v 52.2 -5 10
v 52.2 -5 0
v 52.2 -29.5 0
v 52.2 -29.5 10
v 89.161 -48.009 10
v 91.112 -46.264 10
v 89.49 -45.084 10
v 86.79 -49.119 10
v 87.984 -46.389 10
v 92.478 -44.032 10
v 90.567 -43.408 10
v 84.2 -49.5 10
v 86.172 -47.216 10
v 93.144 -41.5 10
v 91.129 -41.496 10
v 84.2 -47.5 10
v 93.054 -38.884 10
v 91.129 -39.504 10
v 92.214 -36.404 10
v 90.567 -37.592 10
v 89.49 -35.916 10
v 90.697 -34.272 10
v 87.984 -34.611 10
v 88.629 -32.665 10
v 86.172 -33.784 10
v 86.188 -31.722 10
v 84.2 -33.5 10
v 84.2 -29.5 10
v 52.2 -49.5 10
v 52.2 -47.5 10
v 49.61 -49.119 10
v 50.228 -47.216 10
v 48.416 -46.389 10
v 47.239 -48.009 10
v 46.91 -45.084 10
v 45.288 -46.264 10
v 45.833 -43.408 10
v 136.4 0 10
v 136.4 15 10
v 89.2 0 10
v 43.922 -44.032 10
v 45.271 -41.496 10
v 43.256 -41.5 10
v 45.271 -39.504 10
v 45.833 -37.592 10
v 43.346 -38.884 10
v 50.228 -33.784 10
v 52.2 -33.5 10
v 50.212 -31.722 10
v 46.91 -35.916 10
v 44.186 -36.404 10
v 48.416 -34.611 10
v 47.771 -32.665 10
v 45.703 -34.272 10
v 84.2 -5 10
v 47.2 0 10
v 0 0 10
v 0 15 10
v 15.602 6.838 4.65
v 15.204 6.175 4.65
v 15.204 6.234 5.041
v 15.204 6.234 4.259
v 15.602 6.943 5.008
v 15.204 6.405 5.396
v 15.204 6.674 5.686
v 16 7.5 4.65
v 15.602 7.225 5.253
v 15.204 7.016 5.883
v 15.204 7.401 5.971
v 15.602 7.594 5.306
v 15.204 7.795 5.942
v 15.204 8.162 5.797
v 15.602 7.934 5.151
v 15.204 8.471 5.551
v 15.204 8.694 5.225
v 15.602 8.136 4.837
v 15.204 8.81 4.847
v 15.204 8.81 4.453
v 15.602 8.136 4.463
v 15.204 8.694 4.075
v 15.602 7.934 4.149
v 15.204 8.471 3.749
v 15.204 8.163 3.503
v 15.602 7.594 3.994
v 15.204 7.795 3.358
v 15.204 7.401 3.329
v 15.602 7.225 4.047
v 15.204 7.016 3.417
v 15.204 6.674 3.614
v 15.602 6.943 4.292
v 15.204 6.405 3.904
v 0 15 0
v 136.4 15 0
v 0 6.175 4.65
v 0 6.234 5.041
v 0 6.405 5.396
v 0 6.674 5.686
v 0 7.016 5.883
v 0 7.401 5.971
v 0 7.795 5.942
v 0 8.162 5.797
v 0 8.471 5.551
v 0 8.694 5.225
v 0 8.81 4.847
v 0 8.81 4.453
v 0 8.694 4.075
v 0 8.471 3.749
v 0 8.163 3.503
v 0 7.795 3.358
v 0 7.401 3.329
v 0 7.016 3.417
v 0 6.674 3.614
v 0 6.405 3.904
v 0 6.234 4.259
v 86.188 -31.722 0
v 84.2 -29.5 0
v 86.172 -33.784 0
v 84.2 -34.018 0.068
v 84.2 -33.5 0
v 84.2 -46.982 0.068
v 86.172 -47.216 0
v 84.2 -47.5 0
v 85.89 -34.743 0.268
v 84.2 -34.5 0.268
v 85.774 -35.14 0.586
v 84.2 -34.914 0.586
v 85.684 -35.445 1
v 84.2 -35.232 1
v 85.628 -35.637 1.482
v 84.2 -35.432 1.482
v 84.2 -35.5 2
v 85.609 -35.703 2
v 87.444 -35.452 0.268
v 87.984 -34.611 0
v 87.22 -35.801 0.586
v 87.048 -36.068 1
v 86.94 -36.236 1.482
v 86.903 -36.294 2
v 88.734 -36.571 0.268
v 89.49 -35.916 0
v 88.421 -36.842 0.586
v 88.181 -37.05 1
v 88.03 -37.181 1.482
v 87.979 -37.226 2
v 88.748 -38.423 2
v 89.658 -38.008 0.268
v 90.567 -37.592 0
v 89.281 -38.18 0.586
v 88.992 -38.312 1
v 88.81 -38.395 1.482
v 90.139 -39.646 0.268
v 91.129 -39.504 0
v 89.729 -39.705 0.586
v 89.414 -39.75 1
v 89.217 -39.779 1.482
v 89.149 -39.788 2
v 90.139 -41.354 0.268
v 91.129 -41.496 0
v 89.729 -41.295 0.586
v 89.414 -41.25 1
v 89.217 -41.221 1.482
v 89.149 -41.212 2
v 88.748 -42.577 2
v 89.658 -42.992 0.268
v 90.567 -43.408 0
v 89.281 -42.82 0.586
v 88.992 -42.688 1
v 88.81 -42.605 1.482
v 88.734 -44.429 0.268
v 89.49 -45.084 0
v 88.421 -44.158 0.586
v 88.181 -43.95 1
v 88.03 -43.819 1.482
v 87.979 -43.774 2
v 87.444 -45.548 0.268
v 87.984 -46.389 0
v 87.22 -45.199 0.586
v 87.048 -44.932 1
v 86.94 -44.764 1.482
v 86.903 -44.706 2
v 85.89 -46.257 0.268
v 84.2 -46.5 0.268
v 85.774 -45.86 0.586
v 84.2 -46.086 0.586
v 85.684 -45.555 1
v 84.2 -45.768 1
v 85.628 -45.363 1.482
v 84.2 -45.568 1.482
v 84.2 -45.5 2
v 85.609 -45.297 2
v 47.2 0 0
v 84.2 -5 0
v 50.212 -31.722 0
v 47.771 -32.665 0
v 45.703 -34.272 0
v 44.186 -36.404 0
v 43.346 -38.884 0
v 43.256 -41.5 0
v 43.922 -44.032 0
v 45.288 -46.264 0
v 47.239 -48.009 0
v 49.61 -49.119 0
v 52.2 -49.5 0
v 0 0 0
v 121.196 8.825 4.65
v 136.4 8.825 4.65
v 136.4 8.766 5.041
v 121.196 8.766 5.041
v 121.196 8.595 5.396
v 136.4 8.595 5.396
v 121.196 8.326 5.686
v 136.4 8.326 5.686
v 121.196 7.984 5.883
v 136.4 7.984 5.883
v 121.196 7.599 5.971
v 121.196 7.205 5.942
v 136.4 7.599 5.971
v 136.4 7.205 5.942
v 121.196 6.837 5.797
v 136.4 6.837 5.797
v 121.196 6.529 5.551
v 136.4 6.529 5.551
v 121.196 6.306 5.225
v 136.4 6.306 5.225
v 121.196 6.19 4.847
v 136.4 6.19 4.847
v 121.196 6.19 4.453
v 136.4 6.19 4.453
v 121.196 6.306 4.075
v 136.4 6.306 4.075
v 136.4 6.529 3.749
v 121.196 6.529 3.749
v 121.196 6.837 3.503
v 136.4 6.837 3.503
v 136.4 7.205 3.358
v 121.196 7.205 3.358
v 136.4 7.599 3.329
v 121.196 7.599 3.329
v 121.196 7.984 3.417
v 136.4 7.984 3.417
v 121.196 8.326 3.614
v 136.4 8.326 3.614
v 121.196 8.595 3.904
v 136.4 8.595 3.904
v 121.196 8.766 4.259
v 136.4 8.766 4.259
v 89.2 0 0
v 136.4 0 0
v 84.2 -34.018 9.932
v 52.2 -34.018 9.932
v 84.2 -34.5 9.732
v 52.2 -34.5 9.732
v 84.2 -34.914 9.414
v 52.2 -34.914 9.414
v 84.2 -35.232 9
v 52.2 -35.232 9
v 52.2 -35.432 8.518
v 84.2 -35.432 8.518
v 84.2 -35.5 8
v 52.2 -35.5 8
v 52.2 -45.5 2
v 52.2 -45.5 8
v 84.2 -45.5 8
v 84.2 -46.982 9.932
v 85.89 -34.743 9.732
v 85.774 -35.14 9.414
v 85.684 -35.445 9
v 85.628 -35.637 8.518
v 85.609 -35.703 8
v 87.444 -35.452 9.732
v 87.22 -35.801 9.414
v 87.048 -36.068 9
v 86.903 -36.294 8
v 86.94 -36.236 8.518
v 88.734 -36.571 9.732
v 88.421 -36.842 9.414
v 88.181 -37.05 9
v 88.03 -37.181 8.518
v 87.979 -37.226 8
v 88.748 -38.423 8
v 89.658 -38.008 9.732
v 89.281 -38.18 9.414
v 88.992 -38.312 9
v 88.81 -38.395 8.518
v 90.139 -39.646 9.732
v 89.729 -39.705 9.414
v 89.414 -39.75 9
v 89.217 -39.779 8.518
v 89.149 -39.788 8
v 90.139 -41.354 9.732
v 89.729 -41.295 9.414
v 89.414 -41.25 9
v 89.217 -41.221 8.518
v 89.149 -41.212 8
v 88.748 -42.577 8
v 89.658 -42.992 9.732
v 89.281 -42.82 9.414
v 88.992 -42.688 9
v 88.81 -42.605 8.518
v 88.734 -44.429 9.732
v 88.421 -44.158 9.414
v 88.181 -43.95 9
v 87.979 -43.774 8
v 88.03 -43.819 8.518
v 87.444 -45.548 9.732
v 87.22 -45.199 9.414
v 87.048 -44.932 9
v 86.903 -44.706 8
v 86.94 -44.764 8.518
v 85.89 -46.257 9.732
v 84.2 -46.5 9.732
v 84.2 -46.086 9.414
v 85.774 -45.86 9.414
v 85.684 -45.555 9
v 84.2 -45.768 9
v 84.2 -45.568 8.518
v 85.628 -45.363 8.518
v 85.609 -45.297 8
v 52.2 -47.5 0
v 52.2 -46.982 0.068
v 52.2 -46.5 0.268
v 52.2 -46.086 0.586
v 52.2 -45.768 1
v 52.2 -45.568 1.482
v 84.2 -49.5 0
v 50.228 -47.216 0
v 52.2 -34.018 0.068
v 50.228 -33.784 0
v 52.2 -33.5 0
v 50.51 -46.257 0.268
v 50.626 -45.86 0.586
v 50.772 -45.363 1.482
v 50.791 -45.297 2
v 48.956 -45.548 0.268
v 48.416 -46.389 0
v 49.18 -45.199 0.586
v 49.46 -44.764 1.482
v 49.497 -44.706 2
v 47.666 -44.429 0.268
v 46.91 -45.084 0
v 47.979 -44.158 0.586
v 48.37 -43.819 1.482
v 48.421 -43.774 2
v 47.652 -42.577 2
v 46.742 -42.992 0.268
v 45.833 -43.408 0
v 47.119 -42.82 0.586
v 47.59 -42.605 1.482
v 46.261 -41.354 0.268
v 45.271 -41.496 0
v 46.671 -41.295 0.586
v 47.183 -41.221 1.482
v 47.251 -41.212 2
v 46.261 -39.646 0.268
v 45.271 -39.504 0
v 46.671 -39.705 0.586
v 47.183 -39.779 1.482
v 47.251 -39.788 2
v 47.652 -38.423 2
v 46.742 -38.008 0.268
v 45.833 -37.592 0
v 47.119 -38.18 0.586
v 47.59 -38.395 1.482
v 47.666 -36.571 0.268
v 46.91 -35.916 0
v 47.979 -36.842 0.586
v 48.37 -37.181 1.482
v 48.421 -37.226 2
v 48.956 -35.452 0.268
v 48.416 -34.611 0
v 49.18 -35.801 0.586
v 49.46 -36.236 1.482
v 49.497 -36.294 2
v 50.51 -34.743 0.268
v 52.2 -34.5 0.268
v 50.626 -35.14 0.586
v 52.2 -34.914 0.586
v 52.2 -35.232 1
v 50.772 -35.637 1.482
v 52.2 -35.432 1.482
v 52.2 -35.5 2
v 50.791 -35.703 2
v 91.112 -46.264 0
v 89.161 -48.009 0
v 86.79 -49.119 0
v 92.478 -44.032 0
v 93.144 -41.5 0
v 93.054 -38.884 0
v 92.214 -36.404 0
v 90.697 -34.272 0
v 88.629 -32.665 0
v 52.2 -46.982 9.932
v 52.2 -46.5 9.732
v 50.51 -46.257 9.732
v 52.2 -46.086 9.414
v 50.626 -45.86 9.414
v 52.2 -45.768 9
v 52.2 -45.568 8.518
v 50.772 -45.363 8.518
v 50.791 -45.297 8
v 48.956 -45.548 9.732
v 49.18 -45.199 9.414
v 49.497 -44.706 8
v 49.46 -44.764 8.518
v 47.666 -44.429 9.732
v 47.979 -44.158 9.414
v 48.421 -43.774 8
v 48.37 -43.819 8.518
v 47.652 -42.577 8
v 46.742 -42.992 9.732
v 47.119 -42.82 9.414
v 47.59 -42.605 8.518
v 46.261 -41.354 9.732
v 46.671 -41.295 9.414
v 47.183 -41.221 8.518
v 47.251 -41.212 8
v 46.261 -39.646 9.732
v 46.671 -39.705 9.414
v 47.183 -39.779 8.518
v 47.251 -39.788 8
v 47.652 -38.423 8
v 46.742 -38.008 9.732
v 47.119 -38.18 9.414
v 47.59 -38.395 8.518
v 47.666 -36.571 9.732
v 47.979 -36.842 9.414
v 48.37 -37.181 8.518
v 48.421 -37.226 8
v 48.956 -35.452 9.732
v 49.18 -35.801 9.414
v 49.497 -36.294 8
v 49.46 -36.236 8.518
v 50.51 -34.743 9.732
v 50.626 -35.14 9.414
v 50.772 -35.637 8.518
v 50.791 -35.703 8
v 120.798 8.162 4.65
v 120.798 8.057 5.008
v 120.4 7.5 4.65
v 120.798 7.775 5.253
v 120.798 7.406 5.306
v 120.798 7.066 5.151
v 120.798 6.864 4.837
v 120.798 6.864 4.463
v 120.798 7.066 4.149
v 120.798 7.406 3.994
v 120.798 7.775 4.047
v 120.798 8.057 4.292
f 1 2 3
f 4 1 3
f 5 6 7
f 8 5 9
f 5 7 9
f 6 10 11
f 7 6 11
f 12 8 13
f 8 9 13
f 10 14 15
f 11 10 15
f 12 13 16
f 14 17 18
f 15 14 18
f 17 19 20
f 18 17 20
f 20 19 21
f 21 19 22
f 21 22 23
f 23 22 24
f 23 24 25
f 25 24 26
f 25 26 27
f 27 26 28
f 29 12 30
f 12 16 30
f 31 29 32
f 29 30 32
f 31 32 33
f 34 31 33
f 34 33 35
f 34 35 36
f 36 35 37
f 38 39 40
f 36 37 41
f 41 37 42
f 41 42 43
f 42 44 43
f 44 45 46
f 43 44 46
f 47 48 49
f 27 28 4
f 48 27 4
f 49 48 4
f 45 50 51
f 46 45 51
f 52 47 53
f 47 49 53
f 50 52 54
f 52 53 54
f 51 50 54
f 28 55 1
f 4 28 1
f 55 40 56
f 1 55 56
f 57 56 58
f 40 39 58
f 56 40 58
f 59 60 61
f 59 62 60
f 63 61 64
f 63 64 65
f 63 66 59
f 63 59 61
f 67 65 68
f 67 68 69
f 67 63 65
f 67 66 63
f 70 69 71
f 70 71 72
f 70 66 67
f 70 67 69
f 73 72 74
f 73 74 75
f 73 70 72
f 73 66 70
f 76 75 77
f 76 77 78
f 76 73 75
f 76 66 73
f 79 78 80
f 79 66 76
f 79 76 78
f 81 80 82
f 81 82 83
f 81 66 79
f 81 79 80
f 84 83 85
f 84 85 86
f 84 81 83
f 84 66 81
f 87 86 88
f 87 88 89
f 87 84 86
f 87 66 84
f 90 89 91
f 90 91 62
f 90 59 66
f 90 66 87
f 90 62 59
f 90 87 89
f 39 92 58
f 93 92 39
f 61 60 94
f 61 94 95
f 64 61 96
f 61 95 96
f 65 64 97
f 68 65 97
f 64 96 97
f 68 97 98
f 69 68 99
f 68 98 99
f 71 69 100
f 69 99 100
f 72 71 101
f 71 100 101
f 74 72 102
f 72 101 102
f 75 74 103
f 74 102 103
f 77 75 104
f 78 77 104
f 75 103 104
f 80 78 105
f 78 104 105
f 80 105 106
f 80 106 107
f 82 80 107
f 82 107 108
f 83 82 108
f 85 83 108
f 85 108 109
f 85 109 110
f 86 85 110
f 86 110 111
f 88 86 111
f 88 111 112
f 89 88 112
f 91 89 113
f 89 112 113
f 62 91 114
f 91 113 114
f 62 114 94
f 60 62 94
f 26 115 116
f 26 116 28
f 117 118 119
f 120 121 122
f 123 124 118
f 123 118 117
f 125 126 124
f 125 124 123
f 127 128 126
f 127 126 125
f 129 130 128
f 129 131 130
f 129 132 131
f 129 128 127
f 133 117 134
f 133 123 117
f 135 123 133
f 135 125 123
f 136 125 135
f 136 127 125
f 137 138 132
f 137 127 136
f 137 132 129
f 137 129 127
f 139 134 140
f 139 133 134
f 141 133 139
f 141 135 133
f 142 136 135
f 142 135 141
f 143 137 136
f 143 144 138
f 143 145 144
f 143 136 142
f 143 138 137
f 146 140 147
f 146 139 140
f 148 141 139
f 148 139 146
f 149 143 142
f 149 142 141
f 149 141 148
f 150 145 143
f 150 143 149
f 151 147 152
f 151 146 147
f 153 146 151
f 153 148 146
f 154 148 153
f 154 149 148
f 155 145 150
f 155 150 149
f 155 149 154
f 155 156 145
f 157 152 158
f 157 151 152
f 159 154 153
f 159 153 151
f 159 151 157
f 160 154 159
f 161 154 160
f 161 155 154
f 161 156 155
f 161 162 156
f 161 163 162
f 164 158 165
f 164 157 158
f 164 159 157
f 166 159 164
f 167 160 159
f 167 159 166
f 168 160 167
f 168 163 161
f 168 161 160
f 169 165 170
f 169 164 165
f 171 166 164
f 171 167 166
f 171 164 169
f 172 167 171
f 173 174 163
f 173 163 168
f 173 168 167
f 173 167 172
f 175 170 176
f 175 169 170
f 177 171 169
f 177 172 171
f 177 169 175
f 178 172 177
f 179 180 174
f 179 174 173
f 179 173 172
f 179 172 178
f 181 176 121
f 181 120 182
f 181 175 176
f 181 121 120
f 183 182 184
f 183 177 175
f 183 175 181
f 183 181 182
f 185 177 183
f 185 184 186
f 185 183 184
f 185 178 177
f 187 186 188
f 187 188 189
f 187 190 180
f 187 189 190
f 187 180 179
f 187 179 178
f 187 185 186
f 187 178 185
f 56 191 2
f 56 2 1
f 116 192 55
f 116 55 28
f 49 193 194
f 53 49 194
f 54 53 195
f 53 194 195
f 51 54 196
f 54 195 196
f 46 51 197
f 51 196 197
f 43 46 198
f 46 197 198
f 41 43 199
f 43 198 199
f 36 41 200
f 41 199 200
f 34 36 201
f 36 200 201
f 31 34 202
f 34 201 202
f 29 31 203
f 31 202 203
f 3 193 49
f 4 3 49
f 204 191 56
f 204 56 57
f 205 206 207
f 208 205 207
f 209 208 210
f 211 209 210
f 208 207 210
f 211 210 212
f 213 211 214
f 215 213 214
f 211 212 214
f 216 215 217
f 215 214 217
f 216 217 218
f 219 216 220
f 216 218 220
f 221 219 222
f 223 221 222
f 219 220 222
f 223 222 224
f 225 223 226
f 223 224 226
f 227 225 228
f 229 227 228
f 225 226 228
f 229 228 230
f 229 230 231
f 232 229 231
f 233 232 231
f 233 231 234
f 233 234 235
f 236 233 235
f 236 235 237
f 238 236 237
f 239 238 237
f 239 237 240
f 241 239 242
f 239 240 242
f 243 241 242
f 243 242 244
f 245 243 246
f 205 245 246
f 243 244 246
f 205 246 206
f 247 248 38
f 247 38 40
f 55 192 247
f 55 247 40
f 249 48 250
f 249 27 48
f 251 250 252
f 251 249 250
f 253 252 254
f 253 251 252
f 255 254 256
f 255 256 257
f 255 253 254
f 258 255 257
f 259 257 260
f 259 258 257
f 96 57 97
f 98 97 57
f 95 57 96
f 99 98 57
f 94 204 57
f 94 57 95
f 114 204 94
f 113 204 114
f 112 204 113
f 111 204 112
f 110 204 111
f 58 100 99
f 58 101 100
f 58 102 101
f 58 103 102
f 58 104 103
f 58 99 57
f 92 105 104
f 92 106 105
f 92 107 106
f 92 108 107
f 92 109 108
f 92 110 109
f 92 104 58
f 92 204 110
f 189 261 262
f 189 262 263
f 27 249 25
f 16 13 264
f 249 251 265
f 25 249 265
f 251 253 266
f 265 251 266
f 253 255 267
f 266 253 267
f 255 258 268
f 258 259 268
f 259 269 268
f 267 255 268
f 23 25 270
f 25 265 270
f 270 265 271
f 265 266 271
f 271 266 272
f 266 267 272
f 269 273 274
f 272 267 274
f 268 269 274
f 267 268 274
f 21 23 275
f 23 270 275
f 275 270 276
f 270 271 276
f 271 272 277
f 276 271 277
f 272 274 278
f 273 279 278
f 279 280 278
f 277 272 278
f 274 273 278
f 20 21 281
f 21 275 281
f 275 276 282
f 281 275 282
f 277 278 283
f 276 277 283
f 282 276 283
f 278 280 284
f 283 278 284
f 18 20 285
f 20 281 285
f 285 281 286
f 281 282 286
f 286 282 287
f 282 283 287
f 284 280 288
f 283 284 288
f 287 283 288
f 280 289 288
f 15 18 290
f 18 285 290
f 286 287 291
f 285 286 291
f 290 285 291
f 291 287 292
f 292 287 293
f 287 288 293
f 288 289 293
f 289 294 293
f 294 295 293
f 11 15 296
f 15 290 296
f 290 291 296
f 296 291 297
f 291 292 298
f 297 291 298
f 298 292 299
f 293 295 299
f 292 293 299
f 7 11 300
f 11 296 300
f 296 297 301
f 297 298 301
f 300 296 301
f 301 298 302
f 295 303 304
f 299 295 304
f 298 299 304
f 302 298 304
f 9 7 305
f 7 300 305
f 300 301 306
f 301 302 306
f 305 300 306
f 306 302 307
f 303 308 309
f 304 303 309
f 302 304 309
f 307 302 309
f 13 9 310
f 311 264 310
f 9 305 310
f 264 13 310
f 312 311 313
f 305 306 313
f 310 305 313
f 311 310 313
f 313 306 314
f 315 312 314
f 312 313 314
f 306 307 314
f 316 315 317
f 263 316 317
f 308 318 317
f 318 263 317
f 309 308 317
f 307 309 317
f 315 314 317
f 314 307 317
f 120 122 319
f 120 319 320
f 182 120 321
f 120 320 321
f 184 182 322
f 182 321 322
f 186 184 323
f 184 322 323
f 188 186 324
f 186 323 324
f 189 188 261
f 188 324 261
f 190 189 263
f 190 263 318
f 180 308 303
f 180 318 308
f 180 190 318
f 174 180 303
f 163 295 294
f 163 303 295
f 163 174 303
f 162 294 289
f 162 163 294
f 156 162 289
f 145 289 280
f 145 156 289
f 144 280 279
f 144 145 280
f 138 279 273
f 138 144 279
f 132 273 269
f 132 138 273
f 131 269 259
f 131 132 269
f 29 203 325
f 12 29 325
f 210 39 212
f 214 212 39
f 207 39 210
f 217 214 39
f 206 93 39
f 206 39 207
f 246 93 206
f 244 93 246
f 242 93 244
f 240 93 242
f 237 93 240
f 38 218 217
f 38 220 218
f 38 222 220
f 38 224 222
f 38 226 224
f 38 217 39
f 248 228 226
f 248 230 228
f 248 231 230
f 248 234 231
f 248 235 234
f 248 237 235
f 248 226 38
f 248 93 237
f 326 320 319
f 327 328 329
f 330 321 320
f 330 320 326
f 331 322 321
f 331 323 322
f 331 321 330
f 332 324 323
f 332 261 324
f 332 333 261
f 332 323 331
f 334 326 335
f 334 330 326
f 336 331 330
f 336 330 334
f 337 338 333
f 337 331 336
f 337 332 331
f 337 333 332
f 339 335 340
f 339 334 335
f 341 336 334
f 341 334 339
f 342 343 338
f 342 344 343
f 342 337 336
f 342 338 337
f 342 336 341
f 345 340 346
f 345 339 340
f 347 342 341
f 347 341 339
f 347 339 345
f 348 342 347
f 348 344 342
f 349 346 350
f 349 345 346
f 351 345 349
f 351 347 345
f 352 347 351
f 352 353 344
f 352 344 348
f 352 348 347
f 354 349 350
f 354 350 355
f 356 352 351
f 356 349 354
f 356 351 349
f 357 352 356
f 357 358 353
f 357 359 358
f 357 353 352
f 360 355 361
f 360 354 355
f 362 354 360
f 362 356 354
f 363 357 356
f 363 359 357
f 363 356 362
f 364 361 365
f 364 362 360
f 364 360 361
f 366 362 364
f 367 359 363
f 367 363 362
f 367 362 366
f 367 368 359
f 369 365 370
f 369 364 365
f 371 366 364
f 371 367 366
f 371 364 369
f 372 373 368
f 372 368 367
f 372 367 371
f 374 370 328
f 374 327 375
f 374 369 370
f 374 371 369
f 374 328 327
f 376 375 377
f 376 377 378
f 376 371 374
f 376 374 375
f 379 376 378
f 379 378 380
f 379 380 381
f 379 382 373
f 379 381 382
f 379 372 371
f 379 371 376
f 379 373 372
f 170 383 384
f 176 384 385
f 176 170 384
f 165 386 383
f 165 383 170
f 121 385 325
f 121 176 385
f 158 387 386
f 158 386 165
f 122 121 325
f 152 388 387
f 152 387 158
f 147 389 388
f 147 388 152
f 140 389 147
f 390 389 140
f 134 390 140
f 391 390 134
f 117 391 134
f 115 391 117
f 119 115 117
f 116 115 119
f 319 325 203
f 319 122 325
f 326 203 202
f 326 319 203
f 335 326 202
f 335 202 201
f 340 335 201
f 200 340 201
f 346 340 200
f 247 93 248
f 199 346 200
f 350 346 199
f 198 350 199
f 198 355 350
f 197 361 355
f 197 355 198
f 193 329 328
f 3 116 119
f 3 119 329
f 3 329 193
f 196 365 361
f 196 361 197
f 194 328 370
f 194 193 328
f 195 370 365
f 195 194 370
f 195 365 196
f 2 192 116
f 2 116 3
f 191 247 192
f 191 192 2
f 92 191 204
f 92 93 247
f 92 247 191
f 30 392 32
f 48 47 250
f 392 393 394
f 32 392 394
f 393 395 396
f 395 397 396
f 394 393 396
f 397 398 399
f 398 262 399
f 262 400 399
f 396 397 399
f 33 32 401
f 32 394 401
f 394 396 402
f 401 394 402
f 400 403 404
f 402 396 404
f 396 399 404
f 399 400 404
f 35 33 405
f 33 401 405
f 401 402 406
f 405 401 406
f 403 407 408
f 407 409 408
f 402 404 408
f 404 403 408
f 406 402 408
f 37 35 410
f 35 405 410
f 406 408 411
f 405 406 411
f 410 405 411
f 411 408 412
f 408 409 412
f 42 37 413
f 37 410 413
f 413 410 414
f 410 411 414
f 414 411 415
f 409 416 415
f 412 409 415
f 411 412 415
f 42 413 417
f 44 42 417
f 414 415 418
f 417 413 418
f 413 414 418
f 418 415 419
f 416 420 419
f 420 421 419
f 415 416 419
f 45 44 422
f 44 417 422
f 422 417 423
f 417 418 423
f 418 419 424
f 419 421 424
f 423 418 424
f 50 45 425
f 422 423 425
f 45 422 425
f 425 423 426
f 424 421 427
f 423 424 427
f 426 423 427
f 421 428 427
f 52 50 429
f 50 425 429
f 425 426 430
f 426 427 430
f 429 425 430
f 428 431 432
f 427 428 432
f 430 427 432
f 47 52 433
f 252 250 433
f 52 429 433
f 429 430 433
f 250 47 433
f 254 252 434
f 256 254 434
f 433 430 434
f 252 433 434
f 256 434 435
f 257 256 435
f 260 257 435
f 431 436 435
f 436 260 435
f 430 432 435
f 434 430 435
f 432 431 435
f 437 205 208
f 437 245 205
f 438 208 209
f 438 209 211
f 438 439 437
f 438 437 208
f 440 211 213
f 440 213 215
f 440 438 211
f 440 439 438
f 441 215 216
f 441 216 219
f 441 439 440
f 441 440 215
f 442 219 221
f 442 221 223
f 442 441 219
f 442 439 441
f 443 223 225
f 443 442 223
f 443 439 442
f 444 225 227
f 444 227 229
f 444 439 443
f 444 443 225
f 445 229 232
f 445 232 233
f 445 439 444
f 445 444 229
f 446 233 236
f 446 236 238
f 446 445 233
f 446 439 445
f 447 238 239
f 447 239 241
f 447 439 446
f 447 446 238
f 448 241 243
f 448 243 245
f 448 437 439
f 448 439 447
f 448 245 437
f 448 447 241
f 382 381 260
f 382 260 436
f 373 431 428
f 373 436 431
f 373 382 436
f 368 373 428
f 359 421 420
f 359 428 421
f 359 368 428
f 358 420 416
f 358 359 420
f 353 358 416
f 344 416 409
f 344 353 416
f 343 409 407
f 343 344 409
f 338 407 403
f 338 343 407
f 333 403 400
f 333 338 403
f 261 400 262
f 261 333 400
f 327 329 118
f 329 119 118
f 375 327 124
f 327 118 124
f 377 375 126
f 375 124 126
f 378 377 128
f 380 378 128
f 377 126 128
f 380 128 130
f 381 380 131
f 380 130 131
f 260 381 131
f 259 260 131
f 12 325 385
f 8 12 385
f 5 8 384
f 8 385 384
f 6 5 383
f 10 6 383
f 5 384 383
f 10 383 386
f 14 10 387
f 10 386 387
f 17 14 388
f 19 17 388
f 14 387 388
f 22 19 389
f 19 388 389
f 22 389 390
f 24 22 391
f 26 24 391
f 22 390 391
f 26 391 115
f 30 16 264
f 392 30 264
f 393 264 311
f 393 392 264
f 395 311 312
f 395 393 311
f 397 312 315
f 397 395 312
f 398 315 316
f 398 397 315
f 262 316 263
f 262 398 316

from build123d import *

# Parameters (mm, degrees)
PAD_DEPTH       = 10
SKETCH001_R     = 1.325
HOLE_DEPTH      = 15.20386
HOLE_TIPS_R     = 1.325
SKETCH002_R     = 1.325
HOLE001_DEPTH   = 15.20386
HOLE001_TIPS_R  = 1.325
FILLET_R        = 2
CHAMFER_SIZE    = 2
CHAMFER001_SIZE = 5


with BuildPart() as part:
    # Sketch → Pad (new body)
    with BuildSketch(Plane.XY):
        with BuildLine():
            Line((0, 15), (136.4, 15))
            Line((136.4, 15), (136.4, 0))
            Line((136.4, 0), (84.2, 0))
            Line((84.2, 0), (84.2, -31.5))
            ThreePointArc((84.2, -49.5), (93.2, -40.5), (84.2, -31.5))
            Line((52.2, -49.5), (84.2, -49.5))
            ThreePointArc((52.2, -31.5), (43.2, -40.5), (52.2, -49.5))
            Line((52.2, 0), (52.2, -31.5))
            Line((52.2, 0), (0, 0))
            Line((0, 0), (0, 15))
        make_face()
        with BuildLine():
            ThreePointArc((52.2, -35.5), (47.2, -40.5), (52.2, -45.5))
            Line((52.2, -45.5), (84.2, -45.5))
            ThreePointArc((84.2, -45.5), (89.2, -40.5), (84.2, -35.5))
            Line((52.2, -35.5), (84.2, -35.5))
        make_face(mode=Mode.SUBTRACT)
    extrude(amount=PAD_DEPTH)

    # Sketch001 (on Face2 of Pad) → Hole (cut)
    with BuildSketch(Plane(origin=(0, 0, 0), x_dir=(0, -1, 0), z_dir=(-1, 0, 0))):
        with Locations((-7.5, 4.65)):
            Circle(SKETCH001_R)
    extrude(amount=-HOLE_DEPTH, mode=Mode.SUBTRACT)

    # Hole tips → Hole tip 1 section 0
    with BuildSketch(Plane(origin=(15.20386, 0, 0), x_dir=(0, -1, 0), z_dir=(-1, 0, 0)), mode=Mode.PRIVATE) as hole_tip_1_s0:
        with Locations((-7.5, 4.65)):
            Circle(HOLE_TIPS_R)
    loft([hole_tip_1_s0.sketch, Vertex(16, 7.5, 4.65)], mode=Mode.SUBTRACT)

    # Sketch002 (on Face4 of Pad) → Hole001 (cut)
    with BuildSketch(Plane.YZ.offset(136.4)):
        with Locations((7.5, 4.65)):
            Circle(SKETCH002_R)
    extrude(amount=-HOLE001_DEPTH, mode=Mode.SUBTRACT)

    # Hole001 tips → Hole001 tip 1 section 0
    with BuildSketch(Plane.YZ.offset(121.19614), mode=Mode.PRIVATE) as hole001_tip_1_s0:
        with Locations((7.5, 4.65)):
            Circle(HOLE001_TIPS_R)
    loft([hole001_tip_1_s0.sketch, Vertex(120.4, 7.5, 4.65)], mode=Mode.SUBTRACT)

    # Fillet
    fillet_edges = [part.edges().sort_by_distance(p)[0] for p in [
        (68.2, -35.5, 10),
        (89.2, -40.5, 10),
        (47.2, -40.5, 10),
        (68.2, -45.5, 10),
        (68.2, -35.5, 0),
        (89.2, -40.5, 0),
        (68.2, -45.5, 0),
        (47.2, -40.5, 0),
    ]]
    fillet(fillet_edges, radius=FILLET_R)

    # Chamfer
    chamfer_edges = [part.edges().sort_by_distance(p)[0] for p in [
        (52.2, -31.5, 5),
        (84.2, -31.5, 5),
    ]]
    chamfer(chamfer_edges, length=CHAMFER_SIZE)

    # Chamfer001
    chamfer001_edges = [part.edges().sort_by_distance(p)[0] for p in [
        (52.2, 0, 5),
        (84.2, 0, 5),
    ]]
    chamfer(chamfer001_edges, length=CHAMFER001_SIZE)


solid = part.part
